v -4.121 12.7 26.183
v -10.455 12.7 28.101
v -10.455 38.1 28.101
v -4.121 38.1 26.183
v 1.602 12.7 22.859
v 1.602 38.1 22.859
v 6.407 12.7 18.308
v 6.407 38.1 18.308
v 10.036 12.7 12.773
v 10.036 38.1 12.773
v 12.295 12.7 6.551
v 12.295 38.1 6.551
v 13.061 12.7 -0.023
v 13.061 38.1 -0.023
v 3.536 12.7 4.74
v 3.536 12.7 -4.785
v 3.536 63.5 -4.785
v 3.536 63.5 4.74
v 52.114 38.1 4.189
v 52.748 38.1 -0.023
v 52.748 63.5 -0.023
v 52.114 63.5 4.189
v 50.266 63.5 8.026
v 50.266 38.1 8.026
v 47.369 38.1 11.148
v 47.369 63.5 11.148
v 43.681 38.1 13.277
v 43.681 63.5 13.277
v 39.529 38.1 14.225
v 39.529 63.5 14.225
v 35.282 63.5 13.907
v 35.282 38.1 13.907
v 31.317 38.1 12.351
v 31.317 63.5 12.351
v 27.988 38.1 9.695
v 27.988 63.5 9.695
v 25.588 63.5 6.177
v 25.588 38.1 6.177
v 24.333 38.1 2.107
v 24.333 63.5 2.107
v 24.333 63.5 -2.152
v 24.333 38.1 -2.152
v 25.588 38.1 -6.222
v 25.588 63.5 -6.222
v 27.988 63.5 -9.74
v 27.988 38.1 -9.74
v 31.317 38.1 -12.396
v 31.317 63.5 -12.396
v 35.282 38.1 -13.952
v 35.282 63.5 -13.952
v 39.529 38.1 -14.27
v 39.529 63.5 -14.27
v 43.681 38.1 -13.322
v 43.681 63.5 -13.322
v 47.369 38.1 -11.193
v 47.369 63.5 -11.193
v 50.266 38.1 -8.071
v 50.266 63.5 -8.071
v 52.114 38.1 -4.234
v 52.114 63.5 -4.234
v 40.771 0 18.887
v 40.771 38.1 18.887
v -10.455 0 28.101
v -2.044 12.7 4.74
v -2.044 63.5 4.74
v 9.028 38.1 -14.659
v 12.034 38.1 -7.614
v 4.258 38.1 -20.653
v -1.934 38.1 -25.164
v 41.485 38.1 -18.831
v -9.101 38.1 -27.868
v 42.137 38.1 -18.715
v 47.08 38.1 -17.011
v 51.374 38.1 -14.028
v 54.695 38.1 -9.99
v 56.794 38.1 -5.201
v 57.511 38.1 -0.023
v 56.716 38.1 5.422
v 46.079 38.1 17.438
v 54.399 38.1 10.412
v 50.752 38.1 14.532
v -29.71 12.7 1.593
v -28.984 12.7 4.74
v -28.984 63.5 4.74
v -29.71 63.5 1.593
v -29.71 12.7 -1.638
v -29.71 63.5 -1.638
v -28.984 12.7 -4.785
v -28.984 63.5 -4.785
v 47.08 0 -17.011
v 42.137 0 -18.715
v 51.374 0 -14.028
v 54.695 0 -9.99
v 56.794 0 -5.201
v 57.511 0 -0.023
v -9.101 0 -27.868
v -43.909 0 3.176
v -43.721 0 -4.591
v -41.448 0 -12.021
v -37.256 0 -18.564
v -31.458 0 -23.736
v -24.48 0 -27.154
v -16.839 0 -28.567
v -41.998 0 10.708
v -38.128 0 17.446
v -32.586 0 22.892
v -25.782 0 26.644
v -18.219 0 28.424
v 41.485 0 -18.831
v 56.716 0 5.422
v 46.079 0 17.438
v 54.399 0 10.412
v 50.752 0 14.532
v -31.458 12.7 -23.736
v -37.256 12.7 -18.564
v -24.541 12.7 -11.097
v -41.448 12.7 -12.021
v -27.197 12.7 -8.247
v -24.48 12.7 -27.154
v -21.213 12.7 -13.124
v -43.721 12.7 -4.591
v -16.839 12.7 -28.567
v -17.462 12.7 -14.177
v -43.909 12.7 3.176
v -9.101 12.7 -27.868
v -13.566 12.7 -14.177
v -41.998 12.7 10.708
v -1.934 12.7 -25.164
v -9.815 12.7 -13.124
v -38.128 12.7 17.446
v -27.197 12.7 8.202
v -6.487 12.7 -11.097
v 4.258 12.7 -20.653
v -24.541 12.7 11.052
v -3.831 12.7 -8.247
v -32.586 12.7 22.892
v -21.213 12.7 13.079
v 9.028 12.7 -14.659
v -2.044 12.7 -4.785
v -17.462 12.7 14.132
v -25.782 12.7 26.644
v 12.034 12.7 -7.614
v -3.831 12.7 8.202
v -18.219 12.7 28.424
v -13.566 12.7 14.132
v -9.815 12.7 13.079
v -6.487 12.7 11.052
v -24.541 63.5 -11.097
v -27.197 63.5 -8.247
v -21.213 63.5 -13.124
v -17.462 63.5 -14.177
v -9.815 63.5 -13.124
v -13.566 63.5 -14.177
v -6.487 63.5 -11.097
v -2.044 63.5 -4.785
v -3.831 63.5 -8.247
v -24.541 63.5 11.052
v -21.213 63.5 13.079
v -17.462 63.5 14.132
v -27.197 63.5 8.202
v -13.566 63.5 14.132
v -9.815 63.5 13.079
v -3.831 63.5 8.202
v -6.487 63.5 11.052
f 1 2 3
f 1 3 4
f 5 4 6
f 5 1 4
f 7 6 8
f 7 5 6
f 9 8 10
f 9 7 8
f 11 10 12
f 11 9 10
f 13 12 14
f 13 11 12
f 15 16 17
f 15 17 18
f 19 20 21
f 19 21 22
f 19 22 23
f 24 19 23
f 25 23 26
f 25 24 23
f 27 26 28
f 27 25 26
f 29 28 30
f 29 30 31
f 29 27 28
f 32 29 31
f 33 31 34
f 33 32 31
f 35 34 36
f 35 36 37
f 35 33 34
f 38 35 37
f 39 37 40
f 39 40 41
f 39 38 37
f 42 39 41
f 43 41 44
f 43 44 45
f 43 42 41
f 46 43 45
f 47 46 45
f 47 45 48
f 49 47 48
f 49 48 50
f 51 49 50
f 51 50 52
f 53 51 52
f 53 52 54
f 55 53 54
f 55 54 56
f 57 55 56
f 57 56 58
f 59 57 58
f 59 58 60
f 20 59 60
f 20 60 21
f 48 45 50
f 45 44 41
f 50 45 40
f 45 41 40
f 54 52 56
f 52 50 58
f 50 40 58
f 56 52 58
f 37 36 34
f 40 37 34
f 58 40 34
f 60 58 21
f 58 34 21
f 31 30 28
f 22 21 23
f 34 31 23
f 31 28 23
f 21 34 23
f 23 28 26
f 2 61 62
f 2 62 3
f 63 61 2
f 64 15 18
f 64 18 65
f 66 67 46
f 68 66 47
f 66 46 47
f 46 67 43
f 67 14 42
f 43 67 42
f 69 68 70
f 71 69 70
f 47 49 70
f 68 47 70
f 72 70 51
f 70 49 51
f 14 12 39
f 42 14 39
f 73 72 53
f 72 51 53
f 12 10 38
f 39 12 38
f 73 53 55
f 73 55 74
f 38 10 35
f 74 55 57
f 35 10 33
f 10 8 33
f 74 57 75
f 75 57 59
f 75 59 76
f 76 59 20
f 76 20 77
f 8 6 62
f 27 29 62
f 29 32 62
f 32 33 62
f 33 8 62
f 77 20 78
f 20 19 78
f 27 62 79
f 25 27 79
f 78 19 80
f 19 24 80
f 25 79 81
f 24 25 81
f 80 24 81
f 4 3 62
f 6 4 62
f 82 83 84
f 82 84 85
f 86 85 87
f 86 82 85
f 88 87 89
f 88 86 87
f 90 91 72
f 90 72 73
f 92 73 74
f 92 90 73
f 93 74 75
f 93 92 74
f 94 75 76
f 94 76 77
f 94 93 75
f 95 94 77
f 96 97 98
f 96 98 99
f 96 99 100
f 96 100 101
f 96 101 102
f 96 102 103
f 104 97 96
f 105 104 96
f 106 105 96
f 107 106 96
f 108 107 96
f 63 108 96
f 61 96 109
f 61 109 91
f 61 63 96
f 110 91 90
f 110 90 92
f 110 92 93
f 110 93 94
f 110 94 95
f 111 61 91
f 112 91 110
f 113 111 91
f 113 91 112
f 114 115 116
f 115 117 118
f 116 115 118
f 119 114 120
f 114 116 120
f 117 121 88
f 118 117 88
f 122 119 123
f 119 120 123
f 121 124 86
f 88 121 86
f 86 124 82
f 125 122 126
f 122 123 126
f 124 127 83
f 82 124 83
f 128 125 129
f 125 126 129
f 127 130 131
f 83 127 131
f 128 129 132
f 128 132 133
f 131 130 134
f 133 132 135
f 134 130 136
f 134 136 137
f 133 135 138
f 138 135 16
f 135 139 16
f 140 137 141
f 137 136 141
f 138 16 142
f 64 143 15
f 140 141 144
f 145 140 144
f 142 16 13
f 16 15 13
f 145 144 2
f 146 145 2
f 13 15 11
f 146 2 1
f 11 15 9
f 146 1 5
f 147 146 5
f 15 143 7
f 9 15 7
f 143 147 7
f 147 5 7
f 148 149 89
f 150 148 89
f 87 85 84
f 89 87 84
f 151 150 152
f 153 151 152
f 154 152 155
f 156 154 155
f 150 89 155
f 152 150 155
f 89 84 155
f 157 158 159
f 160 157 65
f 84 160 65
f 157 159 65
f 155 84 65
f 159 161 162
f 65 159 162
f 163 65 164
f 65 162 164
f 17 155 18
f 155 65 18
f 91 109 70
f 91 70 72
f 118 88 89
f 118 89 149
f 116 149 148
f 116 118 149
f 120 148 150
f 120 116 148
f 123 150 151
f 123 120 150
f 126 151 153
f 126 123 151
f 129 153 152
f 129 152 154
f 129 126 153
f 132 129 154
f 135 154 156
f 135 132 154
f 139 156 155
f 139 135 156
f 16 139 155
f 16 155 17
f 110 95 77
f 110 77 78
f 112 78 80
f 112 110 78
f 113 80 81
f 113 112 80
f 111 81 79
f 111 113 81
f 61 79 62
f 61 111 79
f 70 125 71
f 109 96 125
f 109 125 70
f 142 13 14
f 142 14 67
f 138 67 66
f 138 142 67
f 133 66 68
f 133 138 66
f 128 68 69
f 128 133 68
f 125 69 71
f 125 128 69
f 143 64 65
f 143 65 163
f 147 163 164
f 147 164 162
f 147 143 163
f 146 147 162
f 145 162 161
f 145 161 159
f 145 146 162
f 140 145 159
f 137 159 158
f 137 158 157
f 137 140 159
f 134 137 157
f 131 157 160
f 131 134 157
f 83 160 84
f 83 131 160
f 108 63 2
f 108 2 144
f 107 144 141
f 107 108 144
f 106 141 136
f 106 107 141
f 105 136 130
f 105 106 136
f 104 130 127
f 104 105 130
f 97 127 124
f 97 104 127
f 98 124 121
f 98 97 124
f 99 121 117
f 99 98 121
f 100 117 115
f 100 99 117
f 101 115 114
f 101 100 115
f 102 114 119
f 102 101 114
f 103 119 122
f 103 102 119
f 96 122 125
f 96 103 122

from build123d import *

# Parameters (mm, degrees)
F1_DEPTH = 63.5
F2_DEPTH = 12.7
F0_R     = 14.2875
F3_DEPTH = 38.1
F4_DEPTH = 63.5


with BuildPart() as f1:
    # F0 (on Front) → F1 (new body)
    with BuildSketch(Plane.XZ):
        with BuildLine():
            Line((-28.9843866844, 4.7399969062), (-2.0436183212, 4.7399969062))
            ThreePointArc((-2.0436183212, 4.7399969062), (-15.5140025028, 14.2649969062), (-28.9843866844, 4.7399969062))
        make_face()
        with BuildLine():
            ThreePointArc((-2.0436183212, -4.7850030938), (-1.4322630818, -2.4385476149), (-1.2265025028, -0.0225030938))
            ThreePointArc((-1.2265025028, -0.0225030938), (-1.4322630818, 2.3935414272), (-2.0436183212, 4.7399969062))
            Line((-2.0436183212, 4.7399969062), (-28.9843866844, 4.7399969062))
            ThreePointArc((-28.9843866844, 4.7399969062), (-29.8015025028, -0.0225030938), (-28.9843866844, -4.7850030938))
            Line((-28.9843866844, -4.7850030938), (-2.0436183212, -4.7850030938))
        make_face()
        with BuildLine():
            ThreePointArc((-28.9843866844, -4.7850030938), (-15.5140025028, -14.3100030938), (-2.0436183212, -4.7850030938))
            Line((-2.0436183212, -4.7850030938), (-28.9843866844, -4.7850030938))
        make_face()
        with BuildLine():
            ThreePointArc((-2.0436183212, 4.7399969062), (-1.4322630818, 2.3935414272), (-1.2265025028, -0.0225030938))
            ThreePointArc((-1.2265025028, -0.0225030938), (-1.4322630818, -2.4385476149), (-2.0436183212, -4.7850030938))
            Line((-2.0436183212, -4.7850030938), (3.5359974972, -4.7850030938))
            Line((3.5359974972, -4.7850030938), (3.5359974972, 4.7399969062))
            Line((3.5359974972, 4.7399969062), (-2.0436183212, 4.7399969062))
        make_face()
    extrude(amount=-F1_DEPTH)

    # F0 (on Front) → F2 (join)
    with BuildSketch(Plane.XZ):
        with BuildLine():
            ThreePointArc((-9.1005831185, -27.8684844341), (6.8443749417, -17.8167039201), (13.0609974972, -0.0225030938))
            ThreePointArc((13.0609974972, -0.0225030938), (6.4072485943, 18.3075098722), (-10.4553192367, 28.1011586274))
            ThreePointArc((-10.4553192367, 28.1011586274), (-44.0806355021, -0.713953805), (-9.1005831185, -27.8684844341))
        make_face()
        with BuildLine():
            ThreePointArc((-28.9843866844, 4.7399969062), (-15.5140025028, 14.2649969062), (-2.0436183212, 4.7399969062))
            Line((-2.0436183212, 4.7399969062), (3.5359974972, 4.7399969062))
            Line((3.5359974972, 4.7399969062), (3.5359974972, -4.7850030938))
            Line((3.5359974972, -4.7850030938), (-2.0436183212, -4.7850030938))
            ThreePointArc((-2.0436183212, -4.7850030938), (-15.5140025028, -14.3100030938), (-28.9843866844, -4.7850030938))
            Line((-28.9843866844, -4.7850030938), (-34.5640025028, -4.7850030938))
            Line((-34.5640025028, -4.7850030938), (-34.5640025028, 4.7399969062))
            Line((-34.5640025028, 4.7399969062), (-28.9843866844, 4.7399969062))
        make_face(mode=Mode.SUBTRACT)
        with BuildLine():
            ThreePointArc((-28.9843866844, -4.7850030938), (-29.8015025028, -0.0225030938), (-28.9843866844, 4.7399969062))
            Line((-28.9843866844, 4.7399969062), (-34.5640025028, 4.7399969062))
            Line((-34.5640025028, 4.7399969062), (-34.5640025028, -4.7850030938))
            Line((-34.5640025028, -4.7850030938), (-28.9843866844, -4.7850030938))
        make_face()
    extrude(amount=-F2_DEPTH)

    # F0 (on Front) → F3 (join)
    with BuildSketch(Plane.XZ):
        with BuildLine():
            ThreePointArc((-10.4553192367, 28.1011586274), (6.4072485943, 18.3075098722), (13.0609974972, -0.0225030938))
            ThreePointArc((13.0609974972, -0.0225030938), (6.8443749417, -17.8167039201), (-9.1005831185, -27.8684844341))
            Line((-9.1005831185, -27.8684844341), (41.4850136025, -18.8309540294))
            ThreePointArc((41.4850136025, -18.8309540294), (19.4144080306, -0.3829607102), (40.7712014453, 18.8868982113))
            Line((40.7712014453, 18.8868982113), (-10.4553192367, 28.1011586274))
        make_face()
        with BuildLine():
            ThreePointArc((57.5109974972, -0.0225030938), (52.7247958204, 12.6047118562), (40.7712014453, 18.8868982113))
            ThreePointArc((40.7712014453, 18.8868982113), (19.4144080306, -0.3829607102), (41.4850136025, -18.8309540294))
            Line((41.4850136025, -18.8309540294), (42.136745961, -18.7145167154))
            ThreePointArc((42.136745961, -18.7145167154), (53.1736707457, -12.1237322001), (57.5109974972, -0.0225030938))
        make_face()
        with Locations((38.4609974972, -0.0225030938)):
            Circle(F0_R, mode=Mode.SUBTRACT)
    extrude(amount=-F3_DEPTH)

    # F0 (on Front) → F4 (join)
    with BuildSketch(Plane.XZ):
        with Locations((38.4609974972, -0.0225030938)):
            Circle(F0_R)
    extrude(amount=-F4_DEPTH)


solid = f1.part
